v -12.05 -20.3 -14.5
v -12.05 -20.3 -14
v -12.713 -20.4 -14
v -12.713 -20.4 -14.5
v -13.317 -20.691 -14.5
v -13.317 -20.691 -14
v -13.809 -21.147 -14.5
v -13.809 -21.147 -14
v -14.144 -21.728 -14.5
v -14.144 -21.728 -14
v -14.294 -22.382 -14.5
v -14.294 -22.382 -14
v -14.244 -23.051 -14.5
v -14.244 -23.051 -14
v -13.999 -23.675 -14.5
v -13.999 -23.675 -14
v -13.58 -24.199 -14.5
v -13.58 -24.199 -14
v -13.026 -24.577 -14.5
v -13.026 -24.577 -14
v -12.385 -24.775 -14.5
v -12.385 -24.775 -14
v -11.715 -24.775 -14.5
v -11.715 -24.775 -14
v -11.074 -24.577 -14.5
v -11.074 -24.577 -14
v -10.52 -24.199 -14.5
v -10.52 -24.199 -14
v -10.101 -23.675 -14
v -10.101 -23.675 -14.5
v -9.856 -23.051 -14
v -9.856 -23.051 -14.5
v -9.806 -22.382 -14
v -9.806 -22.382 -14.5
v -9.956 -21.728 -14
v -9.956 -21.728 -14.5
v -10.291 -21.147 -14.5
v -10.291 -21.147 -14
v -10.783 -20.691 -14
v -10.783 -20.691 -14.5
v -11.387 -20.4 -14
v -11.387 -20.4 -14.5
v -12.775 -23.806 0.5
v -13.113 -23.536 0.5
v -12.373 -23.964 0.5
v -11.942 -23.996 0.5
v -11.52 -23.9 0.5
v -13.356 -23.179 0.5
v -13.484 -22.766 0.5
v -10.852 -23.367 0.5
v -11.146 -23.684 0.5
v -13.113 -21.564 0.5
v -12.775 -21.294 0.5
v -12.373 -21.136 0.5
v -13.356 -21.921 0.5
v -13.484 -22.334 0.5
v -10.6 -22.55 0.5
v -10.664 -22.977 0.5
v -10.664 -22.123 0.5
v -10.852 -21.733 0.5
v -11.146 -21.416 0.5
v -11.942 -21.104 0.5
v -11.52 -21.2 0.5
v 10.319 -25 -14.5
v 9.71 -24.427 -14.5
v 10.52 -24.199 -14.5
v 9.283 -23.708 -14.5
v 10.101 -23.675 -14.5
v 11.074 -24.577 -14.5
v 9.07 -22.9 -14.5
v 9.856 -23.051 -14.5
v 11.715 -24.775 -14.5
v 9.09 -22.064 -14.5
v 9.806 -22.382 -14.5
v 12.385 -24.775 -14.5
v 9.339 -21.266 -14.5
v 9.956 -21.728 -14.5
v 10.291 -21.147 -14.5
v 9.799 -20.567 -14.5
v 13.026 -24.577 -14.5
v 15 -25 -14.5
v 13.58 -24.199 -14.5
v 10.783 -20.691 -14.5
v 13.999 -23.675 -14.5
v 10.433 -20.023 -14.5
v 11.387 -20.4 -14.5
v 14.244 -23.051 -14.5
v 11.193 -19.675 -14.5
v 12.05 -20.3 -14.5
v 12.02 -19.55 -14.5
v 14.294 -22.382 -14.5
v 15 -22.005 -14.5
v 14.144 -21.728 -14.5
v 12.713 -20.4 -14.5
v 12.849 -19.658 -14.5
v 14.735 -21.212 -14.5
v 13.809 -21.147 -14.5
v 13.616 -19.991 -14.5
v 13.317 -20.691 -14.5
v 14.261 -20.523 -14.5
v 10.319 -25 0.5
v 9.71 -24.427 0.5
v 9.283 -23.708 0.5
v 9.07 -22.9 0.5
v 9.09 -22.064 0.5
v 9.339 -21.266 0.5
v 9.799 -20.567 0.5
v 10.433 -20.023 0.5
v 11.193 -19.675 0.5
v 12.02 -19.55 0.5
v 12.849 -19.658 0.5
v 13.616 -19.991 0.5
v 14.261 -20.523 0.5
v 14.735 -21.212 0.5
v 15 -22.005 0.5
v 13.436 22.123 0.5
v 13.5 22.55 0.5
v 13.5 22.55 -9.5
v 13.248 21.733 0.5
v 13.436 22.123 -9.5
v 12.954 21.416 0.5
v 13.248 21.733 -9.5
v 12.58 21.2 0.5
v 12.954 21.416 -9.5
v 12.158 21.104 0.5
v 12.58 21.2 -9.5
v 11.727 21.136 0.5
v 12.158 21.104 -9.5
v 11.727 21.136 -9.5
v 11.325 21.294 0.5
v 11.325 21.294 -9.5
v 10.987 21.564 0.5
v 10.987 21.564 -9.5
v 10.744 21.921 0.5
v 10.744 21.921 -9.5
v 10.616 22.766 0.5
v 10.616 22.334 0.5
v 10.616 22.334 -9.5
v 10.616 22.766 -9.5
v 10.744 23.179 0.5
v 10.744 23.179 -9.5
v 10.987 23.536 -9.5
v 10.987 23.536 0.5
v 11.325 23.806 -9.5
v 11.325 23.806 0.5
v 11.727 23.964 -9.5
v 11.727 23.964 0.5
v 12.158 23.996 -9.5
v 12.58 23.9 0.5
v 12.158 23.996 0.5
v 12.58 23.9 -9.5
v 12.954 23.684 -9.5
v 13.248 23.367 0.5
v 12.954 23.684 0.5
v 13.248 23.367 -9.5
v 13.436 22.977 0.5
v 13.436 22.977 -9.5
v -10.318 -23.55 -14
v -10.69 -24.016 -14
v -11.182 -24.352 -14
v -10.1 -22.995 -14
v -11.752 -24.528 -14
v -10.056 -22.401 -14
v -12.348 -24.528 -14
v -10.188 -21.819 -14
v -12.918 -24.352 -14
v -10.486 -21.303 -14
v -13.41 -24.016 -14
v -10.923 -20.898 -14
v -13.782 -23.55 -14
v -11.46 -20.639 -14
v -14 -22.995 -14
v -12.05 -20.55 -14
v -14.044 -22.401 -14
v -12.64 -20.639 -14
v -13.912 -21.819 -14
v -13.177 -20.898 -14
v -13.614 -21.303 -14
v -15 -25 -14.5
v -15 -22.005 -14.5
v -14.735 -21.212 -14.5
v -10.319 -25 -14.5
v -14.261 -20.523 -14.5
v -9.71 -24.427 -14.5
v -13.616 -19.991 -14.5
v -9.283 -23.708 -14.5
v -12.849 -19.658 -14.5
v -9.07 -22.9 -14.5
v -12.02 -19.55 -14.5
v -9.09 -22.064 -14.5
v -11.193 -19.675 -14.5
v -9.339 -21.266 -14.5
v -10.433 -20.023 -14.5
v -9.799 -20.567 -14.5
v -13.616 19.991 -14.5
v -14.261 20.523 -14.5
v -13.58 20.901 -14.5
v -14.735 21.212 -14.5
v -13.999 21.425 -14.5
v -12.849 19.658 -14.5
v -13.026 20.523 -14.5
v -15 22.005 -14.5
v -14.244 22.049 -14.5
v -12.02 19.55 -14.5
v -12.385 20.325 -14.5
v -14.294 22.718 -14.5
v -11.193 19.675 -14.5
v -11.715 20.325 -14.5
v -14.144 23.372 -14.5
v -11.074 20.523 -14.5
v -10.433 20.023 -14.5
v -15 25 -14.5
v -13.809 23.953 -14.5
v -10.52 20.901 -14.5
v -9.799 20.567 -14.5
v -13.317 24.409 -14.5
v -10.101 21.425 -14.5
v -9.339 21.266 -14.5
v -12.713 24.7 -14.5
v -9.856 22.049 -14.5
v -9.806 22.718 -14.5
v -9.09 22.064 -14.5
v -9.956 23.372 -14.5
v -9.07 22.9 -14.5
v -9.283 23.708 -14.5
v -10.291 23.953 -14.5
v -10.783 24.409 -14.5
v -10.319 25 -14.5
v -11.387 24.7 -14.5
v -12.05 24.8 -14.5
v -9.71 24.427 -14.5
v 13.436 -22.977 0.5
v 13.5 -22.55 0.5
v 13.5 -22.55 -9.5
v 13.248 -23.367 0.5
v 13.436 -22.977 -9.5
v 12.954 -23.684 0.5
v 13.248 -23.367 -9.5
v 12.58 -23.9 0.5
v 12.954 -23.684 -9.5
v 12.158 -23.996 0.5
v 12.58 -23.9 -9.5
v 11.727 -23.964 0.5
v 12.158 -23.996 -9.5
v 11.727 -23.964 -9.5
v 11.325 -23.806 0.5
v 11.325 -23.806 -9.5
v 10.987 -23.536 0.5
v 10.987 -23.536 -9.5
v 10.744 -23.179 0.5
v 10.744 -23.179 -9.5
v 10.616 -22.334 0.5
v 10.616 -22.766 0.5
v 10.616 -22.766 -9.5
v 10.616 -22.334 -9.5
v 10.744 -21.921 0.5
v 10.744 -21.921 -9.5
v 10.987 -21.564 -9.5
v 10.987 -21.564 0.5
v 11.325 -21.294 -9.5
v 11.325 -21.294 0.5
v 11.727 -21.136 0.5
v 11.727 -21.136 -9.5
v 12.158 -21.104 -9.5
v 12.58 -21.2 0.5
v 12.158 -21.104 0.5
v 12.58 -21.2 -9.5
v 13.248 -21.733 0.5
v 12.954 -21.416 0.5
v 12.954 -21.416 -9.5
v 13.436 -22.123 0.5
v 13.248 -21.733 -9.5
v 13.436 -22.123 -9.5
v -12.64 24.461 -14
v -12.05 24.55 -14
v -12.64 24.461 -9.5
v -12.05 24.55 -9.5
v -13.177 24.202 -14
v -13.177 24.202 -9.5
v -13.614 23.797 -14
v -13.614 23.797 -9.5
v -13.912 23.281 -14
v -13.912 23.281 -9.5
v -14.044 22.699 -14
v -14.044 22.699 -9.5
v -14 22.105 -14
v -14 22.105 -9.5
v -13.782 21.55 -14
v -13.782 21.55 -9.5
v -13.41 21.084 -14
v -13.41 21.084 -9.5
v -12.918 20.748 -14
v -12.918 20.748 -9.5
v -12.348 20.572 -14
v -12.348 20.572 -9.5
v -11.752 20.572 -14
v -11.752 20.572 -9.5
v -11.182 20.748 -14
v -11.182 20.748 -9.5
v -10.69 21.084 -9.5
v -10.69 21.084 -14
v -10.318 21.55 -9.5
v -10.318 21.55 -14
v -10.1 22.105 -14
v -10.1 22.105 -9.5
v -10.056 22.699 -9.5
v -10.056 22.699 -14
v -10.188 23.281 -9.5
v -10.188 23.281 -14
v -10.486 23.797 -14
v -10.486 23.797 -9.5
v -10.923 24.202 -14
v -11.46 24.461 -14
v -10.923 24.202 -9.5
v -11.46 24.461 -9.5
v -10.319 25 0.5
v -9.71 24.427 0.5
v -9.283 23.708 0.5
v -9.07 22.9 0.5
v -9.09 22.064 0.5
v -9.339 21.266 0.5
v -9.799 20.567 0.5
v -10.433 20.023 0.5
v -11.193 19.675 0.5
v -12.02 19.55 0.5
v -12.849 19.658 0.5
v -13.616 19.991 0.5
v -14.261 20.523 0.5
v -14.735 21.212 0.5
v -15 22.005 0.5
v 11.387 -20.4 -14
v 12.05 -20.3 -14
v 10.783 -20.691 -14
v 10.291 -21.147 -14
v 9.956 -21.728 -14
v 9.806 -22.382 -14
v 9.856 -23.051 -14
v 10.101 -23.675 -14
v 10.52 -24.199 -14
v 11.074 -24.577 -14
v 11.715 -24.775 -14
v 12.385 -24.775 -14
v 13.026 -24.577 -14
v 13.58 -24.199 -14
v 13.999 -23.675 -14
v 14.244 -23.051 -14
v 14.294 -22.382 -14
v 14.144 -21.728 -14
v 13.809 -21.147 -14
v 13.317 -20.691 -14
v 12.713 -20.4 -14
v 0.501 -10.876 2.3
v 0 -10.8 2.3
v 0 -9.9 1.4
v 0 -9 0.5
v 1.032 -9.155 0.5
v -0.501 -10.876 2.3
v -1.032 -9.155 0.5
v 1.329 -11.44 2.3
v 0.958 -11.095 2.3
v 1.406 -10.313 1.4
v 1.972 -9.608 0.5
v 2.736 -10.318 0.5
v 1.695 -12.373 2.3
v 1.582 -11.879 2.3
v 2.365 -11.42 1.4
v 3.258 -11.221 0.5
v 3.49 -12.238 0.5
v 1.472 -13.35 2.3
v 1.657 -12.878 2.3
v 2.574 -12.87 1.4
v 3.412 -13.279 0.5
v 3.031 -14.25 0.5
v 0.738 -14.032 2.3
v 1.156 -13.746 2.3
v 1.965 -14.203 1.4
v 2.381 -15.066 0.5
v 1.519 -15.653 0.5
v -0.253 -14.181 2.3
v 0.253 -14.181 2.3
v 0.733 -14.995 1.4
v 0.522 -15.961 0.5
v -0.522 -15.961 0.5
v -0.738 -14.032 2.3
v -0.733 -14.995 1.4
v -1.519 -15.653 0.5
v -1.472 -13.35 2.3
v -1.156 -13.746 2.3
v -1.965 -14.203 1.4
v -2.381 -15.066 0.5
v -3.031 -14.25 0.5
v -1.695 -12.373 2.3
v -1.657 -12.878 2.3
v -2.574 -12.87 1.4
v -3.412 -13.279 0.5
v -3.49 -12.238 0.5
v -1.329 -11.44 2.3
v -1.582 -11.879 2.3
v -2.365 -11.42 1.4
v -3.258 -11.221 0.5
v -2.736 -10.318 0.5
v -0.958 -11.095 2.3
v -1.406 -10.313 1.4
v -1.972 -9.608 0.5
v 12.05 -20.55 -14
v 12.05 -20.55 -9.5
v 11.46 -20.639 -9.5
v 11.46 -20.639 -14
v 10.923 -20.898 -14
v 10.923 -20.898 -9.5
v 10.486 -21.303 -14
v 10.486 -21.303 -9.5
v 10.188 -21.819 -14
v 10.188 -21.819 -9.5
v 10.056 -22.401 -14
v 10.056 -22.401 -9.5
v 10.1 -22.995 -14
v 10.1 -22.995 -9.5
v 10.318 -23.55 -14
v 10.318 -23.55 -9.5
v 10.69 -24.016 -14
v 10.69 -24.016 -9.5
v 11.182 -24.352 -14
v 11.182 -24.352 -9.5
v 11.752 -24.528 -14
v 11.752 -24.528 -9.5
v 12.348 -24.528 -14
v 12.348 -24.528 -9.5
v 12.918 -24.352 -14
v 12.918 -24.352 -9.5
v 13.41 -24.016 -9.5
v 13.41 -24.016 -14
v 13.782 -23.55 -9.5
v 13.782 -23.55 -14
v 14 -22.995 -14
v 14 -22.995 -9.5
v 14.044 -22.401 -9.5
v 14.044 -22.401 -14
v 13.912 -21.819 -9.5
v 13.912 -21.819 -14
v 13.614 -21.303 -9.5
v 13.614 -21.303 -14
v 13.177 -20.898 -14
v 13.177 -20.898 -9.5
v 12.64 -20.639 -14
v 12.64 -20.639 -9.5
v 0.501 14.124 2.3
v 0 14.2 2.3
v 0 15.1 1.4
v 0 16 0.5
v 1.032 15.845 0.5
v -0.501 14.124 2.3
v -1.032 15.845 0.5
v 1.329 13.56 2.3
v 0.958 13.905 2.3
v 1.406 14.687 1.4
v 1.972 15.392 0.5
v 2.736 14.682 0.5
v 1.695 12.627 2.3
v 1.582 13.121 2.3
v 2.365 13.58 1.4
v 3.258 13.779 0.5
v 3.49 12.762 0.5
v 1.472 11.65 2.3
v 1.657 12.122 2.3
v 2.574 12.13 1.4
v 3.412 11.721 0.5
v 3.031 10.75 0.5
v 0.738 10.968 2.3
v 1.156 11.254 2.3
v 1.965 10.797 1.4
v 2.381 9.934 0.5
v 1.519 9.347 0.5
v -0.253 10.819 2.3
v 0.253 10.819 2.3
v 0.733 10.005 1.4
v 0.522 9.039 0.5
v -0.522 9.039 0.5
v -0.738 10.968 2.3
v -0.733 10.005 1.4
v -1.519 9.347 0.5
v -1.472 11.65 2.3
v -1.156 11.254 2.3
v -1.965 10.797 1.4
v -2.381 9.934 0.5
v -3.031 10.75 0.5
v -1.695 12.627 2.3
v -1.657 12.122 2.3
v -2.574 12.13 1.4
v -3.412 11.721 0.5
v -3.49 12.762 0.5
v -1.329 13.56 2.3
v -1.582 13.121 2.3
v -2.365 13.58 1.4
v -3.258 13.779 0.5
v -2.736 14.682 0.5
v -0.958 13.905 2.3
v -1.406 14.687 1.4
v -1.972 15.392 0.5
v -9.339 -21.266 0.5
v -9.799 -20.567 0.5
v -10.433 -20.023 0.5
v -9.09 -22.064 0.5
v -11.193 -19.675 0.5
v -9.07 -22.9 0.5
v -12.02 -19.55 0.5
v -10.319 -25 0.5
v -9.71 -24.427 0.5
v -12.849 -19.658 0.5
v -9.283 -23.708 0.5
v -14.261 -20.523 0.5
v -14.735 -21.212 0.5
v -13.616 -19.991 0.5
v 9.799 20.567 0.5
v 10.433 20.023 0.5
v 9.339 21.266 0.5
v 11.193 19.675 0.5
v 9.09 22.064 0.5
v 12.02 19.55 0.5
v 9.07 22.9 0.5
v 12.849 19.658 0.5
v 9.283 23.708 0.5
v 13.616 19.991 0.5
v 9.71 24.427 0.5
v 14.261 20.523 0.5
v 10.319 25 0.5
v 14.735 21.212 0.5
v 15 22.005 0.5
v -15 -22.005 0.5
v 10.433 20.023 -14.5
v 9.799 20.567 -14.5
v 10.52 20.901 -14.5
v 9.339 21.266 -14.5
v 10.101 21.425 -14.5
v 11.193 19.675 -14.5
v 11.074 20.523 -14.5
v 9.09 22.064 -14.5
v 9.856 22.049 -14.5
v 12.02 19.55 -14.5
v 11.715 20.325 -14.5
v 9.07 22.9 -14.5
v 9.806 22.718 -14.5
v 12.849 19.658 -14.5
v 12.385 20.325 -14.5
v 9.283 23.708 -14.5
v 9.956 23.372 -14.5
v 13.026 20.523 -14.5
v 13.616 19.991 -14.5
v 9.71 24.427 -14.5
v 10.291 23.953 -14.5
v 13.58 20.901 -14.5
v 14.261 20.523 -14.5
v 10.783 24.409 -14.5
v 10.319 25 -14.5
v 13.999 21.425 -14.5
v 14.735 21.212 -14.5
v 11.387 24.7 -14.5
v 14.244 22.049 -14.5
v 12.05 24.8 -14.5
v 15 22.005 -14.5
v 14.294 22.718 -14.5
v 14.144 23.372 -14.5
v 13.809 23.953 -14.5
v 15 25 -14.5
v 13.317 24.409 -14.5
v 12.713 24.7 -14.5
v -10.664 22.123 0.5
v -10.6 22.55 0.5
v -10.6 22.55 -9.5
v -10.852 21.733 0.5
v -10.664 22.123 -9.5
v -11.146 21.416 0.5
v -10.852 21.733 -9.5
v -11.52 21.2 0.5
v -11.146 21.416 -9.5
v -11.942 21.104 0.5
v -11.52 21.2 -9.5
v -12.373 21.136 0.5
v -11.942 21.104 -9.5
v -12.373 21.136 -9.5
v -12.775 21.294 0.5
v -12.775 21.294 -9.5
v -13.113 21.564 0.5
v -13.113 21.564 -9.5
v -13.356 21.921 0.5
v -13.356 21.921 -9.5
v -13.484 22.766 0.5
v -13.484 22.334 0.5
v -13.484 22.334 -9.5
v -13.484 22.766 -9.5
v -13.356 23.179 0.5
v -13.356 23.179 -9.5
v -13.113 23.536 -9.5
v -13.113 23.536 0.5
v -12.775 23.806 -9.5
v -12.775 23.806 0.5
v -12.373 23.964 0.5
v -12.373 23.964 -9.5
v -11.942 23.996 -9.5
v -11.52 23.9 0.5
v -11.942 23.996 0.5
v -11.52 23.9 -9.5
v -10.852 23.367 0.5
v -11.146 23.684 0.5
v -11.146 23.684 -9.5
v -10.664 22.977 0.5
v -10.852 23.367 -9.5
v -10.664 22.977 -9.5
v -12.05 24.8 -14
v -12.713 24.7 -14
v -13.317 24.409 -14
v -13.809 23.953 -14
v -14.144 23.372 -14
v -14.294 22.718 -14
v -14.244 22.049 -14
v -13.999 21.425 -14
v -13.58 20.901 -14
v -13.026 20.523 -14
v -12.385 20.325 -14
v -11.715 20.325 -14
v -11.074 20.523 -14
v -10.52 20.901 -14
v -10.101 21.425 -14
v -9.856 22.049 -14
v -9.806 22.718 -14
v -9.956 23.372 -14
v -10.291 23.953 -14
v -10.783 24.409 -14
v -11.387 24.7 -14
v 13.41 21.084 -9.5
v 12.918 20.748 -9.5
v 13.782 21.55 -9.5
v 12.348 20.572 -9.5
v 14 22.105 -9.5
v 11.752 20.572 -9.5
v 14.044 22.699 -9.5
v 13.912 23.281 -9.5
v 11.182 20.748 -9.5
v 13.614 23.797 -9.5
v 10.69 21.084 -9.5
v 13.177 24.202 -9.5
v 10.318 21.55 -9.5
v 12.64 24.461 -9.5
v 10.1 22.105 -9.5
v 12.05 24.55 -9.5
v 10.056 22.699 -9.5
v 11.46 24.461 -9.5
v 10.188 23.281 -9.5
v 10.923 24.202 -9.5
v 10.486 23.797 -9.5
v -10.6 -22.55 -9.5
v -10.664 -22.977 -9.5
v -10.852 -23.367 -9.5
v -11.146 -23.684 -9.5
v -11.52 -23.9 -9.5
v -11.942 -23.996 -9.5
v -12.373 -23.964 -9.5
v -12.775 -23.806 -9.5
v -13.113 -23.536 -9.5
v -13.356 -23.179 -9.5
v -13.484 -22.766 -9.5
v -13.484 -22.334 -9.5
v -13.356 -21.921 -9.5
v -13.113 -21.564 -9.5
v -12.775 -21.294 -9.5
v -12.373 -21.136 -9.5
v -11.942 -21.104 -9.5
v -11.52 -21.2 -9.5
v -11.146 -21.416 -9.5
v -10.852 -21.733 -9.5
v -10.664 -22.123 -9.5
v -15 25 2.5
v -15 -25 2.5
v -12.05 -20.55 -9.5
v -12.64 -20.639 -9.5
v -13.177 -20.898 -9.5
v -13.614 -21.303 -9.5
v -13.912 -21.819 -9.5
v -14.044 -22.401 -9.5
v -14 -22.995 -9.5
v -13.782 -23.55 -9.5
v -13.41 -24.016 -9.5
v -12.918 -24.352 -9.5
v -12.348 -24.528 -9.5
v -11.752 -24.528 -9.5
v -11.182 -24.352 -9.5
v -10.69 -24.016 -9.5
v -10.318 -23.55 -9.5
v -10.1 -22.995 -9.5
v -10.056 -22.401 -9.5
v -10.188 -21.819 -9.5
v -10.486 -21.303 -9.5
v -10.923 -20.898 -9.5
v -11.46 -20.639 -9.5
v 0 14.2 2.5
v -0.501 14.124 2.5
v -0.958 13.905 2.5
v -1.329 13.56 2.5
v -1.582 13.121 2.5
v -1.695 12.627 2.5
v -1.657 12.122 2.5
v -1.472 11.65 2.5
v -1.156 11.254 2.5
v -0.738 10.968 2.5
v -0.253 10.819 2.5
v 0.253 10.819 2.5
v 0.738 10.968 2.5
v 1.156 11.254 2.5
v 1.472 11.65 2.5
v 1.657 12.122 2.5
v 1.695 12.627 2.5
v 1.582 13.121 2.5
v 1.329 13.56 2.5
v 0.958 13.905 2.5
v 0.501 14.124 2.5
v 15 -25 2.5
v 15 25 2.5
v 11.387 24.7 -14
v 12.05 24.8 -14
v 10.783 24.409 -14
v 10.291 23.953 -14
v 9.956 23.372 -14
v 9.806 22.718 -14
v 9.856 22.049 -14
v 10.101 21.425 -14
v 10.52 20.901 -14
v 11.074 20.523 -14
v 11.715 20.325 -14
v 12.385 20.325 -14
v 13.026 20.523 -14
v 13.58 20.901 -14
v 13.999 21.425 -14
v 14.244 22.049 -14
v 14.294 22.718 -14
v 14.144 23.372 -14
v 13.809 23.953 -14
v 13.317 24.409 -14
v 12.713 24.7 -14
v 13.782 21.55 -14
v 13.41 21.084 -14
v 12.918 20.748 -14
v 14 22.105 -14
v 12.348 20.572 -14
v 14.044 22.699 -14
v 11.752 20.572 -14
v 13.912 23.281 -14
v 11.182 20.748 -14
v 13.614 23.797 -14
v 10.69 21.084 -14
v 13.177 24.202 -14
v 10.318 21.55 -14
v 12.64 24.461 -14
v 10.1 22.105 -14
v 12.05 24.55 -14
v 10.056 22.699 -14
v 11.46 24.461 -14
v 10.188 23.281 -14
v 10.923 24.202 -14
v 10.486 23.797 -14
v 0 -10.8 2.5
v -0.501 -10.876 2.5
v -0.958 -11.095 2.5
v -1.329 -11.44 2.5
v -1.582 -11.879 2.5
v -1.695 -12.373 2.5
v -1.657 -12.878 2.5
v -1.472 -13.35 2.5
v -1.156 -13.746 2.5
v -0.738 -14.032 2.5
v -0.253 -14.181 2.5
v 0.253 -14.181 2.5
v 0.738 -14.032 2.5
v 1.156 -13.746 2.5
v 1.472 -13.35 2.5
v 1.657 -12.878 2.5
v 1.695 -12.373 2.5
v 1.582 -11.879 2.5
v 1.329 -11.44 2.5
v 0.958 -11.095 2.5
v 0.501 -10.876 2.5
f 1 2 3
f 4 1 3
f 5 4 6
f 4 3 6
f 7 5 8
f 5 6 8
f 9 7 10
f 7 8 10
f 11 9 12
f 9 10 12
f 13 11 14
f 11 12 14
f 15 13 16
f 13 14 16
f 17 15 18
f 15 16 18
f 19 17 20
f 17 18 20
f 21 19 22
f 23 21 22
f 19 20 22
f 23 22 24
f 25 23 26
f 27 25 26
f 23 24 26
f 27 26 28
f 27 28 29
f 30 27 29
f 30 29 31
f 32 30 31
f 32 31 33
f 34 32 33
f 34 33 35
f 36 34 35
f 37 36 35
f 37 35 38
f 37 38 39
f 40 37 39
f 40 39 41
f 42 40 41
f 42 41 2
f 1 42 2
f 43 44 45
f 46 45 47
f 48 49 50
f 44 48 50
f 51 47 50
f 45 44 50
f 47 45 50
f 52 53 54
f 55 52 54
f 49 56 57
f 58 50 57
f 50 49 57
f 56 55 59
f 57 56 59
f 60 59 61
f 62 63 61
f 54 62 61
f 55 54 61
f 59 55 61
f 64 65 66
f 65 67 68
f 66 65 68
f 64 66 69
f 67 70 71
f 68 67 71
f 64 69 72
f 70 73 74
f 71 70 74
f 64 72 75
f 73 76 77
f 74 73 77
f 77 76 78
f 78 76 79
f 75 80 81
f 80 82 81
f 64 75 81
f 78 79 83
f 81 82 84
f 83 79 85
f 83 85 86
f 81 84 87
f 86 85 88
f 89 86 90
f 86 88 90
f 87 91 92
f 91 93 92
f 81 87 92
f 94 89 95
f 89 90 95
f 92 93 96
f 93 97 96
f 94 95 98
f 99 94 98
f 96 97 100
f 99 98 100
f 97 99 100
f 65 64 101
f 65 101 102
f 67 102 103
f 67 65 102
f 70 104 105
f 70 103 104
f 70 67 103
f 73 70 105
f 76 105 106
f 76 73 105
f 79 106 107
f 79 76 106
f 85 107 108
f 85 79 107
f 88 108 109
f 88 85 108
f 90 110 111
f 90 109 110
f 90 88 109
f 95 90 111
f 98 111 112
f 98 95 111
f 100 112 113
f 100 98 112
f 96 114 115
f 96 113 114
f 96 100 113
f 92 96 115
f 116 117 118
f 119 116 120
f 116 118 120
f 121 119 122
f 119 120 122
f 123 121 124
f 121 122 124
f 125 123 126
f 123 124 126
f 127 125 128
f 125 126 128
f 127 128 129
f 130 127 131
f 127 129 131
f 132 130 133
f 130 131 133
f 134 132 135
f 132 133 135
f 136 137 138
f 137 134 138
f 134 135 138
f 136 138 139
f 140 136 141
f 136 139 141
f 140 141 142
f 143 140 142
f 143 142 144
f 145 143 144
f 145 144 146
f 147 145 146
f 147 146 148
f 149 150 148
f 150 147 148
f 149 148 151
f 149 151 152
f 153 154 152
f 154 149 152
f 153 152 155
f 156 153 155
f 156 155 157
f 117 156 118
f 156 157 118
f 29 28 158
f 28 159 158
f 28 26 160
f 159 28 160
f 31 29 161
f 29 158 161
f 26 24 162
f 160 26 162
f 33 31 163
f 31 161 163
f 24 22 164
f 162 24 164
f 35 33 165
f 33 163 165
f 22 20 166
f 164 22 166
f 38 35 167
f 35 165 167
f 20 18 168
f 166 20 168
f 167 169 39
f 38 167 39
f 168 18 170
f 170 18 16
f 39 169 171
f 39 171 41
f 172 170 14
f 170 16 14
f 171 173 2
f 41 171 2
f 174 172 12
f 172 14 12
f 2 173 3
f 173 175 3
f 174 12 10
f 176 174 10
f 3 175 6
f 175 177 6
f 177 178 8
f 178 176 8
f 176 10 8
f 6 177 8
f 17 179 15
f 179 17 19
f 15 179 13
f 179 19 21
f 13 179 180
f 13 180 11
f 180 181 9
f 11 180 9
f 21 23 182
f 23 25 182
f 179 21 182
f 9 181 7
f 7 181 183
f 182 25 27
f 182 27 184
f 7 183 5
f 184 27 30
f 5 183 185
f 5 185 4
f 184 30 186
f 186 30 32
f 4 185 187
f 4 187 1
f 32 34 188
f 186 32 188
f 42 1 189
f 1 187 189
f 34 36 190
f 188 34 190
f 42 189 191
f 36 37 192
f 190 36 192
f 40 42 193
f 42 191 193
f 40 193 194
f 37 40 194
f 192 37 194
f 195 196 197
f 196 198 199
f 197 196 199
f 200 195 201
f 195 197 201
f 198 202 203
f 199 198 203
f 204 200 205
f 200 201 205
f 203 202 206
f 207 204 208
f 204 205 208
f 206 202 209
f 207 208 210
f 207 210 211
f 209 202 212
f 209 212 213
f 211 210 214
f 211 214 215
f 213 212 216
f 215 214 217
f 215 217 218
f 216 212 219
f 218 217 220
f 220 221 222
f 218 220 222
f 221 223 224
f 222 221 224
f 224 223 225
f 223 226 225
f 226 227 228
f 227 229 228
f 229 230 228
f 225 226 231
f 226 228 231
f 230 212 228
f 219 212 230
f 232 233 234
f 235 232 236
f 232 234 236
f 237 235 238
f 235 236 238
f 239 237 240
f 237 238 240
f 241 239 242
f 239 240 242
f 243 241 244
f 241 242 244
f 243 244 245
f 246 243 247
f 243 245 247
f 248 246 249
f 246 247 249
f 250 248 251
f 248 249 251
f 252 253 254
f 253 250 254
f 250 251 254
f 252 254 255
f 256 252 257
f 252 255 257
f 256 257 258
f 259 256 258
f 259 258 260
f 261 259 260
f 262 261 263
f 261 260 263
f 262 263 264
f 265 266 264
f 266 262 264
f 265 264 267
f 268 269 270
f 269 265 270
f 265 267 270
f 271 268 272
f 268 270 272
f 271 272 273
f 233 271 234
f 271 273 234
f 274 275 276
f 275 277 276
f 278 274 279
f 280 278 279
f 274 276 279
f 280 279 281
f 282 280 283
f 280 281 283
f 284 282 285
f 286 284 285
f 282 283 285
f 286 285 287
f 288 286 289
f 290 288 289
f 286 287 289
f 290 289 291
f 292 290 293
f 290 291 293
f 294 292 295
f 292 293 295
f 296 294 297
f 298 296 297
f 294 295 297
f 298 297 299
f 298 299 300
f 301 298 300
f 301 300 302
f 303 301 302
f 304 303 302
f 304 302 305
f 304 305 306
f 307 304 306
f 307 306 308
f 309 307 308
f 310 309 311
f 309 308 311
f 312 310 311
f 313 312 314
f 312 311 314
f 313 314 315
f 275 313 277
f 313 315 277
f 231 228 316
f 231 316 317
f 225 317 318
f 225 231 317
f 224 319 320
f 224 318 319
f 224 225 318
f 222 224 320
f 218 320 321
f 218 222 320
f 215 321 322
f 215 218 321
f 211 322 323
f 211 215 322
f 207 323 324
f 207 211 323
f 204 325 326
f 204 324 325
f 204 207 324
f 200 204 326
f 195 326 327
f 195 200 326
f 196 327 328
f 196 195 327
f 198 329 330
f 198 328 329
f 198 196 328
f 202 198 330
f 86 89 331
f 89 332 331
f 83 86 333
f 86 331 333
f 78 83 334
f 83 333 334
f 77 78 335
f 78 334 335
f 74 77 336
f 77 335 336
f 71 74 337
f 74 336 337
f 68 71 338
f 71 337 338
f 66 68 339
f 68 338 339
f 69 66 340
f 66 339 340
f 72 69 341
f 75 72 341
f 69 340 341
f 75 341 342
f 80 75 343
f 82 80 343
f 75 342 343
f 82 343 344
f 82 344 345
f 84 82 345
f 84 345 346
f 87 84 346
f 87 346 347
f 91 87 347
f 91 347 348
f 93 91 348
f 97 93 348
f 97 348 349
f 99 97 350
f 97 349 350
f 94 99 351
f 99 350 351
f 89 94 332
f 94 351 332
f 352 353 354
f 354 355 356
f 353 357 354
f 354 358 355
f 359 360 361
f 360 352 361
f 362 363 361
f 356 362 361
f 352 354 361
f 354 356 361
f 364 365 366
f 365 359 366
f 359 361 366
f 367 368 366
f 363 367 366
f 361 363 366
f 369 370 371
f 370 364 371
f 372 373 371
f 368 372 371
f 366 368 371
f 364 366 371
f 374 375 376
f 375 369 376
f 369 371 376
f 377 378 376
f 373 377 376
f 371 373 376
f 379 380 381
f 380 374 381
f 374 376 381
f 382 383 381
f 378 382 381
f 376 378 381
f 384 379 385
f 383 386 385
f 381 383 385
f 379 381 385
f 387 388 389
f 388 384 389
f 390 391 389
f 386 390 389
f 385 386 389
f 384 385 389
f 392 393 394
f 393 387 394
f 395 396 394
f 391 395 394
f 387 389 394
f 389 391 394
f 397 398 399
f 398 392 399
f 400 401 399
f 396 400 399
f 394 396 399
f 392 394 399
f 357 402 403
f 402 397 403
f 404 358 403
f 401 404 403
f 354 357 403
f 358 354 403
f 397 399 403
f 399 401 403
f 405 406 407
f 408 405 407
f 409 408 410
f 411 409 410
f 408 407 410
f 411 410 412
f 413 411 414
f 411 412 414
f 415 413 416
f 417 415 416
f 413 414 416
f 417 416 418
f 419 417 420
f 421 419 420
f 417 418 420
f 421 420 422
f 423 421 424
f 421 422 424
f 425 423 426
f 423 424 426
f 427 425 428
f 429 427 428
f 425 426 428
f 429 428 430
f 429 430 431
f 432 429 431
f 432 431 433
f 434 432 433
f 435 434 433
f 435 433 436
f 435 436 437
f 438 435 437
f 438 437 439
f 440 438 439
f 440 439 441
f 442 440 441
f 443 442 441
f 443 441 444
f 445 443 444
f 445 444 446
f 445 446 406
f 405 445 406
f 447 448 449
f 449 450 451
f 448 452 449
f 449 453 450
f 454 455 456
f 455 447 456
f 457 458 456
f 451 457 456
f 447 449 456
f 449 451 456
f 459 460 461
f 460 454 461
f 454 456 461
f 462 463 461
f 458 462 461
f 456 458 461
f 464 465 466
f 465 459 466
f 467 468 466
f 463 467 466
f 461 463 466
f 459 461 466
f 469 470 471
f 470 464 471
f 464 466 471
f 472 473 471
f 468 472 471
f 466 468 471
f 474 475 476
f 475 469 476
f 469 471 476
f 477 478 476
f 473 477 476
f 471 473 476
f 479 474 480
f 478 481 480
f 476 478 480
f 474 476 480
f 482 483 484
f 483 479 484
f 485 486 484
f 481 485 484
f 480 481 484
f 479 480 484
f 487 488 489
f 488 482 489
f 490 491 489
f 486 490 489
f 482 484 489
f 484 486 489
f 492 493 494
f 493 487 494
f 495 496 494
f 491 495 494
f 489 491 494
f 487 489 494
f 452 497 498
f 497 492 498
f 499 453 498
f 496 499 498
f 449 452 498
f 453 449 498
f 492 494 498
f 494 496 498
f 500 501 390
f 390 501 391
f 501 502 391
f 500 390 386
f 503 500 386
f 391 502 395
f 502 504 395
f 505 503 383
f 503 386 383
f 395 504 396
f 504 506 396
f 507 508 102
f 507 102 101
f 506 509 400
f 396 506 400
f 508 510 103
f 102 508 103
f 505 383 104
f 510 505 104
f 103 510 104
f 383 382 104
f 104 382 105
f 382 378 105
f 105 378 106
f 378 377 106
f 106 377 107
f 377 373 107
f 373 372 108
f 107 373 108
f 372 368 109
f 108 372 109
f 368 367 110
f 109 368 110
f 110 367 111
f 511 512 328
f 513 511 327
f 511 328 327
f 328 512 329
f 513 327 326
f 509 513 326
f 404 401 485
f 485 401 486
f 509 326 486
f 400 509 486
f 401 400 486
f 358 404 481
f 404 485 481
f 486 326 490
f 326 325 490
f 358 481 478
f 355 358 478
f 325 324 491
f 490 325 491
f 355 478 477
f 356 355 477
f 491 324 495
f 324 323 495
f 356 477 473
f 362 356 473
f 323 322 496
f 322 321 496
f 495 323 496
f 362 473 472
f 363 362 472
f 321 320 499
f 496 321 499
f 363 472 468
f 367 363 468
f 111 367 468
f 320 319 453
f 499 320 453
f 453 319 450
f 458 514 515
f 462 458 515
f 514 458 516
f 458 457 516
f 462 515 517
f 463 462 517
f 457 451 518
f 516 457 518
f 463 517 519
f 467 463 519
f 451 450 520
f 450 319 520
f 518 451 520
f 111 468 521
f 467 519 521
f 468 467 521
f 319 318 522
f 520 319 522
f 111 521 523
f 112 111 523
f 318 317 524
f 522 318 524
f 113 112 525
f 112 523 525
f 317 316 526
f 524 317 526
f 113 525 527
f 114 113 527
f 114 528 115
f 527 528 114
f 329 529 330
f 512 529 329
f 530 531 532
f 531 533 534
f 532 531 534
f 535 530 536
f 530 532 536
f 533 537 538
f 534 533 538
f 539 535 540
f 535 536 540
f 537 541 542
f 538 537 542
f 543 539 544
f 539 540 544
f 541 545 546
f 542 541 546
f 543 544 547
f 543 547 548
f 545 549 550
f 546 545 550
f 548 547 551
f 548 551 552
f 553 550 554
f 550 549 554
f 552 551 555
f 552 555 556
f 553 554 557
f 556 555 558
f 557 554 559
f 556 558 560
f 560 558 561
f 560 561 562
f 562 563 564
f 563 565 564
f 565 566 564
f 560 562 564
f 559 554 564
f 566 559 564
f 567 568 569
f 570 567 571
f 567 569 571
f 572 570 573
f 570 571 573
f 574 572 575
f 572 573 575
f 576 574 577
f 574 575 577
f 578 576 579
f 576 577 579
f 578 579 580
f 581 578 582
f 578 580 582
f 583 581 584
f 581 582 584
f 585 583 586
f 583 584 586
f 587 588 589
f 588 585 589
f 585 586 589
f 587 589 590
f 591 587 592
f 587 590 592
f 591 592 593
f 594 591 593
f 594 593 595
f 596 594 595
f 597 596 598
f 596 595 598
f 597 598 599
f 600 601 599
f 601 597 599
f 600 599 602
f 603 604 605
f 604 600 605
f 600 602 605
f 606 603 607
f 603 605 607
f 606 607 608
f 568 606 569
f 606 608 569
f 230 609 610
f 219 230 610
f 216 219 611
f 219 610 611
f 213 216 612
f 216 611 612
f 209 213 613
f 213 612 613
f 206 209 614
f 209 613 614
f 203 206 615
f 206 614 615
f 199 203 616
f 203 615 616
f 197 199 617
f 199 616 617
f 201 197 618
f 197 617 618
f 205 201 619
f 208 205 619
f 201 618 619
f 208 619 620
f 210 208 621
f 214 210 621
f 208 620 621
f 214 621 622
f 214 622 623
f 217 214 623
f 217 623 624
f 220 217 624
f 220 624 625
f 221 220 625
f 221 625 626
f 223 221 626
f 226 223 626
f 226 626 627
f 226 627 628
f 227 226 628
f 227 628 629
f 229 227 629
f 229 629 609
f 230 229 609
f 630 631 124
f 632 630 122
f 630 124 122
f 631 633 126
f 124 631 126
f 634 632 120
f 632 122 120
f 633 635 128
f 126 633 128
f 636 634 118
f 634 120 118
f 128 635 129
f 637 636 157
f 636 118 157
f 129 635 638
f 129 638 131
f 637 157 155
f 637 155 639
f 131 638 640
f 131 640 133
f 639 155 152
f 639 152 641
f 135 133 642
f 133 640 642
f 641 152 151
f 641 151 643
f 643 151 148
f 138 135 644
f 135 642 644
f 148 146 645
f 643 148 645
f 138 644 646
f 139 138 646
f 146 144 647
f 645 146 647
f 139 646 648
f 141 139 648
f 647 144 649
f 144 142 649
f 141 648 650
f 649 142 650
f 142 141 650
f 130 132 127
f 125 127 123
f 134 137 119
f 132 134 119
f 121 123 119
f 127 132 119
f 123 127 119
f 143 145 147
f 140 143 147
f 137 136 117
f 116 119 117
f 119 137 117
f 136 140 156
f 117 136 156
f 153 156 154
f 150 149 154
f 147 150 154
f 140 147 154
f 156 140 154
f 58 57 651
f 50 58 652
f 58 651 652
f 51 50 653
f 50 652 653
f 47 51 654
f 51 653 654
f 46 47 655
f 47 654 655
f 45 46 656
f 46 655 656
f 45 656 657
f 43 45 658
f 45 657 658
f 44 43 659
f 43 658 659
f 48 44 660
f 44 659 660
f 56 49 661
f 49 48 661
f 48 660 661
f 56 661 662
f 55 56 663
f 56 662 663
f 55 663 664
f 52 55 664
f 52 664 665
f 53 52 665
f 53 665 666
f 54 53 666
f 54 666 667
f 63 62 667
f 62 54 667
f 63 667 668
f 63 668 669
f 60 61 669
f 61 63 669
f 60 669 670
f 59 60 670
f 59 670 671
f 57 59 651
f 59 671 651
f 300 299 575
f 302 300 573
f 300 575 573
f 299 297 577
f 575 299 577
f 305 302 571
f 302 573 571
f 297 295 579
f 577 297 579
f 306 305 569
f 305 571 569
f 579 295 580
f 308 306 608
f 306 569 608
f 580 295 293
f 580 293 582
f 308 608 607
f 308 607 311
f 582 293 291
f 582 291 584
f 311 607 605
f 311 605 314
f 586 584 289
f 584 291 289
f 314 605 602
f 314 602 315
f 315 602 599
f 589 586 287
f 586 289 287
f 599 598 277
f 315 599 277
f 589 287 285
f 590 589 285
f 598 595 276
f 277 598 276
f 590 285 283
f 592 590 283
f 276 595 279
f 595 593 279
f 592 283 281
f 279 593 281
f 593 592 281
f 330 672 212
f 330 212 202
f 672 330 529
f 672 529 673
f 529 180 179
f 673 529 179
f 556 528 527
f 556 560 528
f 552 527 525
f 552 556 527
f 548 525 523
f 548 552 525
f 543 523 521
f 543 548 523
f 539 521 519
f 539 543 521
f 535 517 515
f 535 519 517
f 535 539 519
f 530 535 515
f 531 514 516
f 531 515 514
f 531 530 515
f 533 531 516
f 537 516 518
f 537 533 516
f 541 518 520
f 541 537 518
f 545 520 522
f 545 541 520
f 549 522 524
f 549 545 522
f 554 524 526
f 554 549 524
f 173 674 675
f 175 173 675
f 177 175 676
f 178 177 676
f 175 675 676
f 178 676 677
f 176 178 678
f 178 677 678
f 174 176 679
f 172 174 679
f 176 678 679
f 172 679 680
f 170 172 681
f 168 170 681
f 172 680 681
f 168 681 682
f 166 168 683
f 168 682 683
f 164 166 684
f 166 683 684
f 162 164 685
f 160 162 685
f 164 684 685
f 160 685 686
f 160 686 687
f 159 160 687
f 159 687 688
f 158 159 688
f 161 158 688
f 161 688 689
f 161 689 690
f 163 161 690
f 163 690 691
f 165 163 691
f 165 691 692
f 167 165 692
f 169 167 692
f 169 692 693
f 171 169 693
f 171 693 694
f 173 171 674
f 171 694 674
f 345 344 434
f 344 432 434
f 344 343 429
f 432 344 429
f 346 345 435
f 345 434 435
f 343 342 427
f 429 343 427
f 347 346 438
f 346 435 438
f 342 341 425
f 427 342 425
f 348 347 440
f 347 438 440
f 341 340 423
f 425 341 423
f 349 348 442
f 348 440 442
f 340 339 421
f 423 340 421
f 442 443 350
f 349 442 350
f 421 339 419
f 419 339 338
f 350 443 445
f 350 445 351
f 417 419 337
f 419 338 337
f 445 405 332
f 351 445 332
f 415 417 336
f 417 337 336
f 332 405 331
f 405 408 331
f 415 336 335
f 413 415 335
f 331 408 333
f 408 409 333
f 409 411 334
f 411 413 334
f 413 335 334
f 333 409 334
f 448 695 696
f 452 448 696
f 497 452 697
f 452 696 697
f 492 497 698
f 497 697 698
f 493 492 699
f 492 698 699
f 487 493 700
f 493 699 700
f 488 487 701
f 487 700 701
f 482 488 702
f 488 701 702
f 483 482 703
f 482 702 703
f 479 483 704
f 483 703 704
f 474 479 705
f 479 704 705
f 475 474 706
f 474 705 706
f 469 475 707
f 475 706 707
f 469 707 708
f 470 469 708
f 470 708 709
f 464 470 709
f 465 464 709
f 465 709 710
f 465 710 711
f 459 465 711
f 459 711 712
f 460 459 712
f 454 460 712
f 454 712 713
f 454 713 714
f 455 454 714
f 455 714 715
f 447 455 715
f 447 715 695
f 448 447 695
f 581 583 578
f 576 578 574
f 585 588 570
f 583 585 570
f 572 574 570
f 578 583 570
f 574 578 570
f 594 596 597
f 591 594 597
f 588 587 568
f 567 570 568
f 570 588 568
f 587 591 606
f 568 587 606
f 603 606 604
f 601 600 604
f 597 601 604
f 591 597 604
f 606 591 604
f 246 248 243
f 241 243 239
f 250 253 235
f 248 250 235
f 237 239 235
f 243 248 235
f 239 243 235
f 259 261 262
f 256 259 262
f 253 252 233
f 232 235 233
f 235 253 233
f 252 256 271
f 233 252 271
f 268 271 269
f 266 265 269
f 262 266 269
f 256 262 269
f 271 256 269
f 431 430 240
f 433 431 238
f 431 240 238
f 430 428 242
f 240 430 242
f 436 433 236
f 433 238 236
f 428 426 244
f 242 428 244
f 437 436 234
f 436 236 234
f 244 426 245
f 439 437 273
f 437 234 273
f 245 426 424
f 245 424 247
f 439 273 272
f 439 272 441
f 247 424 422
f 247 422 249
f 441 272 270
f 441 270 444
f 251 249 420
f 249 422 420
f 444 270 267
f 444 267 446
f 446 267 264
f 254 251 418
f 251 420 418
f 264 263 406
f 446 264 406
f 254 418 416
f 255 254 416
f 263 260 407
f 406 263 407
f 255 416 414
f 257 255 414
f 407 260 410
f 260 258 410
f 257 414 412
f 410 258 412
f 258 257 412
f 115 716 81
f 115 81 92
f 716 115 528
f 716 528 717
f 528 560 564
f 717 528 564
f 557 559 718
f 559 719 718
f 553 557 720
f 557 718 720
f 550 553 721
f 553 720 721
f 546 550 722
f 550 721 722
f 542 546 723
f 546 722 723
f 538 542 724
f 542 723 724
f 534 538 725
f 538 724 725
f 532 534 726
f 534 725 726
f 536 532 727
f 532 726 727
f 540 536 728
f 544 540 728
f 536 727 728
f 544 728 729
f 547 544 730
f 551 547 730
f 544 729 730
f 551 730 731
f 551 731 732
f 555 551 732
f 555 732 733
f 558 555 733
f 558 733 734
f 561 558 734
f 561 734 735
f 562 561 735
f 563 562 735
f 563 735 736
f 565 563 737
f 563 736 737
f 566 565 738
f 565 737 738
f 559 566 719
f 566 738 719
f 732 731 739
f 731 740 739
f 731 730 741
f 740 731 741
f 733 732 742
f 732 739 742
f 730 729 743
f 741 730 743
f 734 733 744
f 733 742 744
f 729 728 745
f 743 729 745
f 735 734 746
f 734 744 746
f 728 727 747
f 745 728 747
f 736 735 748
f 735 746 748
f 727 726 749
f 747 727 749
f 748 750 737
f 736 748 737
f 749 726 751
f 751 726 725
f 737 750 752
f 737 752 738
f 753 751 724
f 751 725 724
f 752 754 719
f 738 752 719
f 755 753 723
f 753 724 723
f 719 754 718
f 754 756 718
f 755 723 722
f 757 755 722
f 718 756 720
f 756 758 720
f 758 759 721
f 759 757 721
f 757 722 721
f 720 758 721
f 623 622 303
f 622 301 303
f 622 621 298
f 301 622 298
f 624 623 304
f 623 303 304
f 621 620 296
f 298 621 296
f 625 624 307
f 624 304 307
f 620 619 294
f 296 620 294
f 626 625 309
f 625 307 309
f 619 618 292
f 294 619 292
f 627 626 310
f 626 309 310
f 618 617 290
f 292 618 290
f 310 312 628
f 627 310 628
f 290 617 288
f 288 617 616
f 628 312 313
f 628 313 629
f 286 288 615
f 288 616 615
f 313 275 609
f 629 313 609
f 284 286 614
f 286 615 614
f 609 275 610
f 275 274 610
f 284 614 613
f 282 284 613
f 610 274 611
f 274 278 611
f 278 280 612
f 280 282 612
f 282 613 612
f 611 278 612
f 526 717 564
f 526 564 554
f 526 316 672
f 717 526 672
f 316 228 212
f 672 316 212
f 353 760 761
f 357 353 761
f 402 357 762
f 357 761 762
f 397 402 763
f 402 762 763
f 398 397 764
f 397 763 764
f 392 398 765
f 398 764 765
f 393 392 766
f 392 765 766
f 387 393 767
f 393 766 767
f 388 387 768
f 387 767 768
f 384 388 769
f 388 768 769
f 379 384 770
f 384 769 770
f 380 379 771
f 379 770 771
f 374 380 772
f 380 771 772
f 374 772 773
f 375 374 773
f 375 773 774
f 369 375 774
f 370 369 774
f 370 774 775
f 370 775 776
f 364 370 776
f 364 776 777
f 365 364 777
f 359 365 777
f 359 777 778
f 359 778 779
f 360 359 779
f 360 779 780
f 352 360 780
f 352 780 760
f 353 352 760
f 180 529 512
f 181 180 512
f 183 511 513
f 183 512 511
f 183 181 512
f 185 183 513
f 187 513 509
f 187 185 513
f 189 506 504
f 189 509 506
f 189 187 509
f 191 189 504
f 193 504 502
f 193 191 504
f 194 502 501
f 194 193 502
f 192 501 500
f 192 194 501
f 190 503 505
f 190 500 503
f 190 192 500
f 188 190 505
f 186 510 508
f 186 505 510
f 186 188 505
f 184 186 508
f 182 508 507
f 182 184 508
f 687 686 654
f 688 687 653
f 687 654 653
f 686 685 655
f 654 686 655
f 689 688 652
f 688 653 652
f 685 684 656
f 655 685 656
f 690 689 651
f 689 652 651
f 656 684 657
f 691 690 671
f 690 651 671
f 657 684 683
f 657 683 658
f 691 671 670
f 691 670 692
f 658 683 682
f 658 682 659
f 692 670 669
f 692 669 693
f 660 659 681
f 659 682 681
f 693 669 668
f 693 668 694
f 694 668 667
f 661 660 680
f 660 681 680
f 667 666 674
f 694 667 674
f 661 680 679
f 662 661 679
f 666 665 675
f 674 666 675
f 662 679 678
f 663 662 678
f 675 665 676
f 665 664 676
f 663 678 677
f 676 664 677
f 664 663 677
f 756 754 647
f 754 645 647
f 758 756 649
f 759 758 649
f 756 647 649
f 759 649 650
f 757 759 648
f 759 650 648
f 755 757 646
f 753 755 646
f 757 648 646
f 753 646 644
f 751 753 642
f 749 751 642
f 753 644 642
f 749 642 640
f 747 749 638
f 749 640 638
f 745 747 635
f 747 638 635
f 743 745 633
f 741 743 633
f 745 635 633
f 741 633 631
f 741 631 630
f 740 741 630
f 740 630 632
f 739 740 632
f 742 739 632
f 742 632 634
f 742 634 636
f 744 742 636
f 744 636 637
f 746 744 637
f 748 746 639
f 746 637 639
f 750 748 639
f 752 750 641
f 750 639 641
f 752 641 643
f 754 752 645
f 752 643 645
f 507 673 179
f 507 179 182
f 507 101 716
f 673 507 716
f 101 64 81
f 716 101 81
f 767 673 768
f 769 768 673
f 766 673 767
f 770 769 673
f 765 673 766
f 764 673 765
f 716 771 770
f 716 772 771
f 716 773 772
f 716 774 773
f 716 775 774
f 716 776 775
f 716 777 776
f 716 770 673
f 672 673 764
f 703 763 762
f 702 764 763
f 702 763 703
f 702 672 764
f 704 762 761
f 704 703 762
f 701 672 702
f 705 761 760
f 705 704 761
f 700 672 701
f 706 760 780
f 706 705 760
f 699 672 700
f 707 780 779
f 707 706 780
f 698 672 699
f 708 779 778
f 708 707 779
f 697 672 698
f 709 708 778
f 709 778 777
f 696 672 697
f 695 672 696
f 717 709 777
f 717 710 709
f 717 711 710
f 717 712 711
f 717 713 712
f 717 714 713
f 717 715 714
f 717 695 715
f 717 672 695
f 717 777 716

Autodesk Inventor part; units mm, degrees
ref_plane "YZ Plane" through (0, 0, 0) normal (1, 0, 0) x (0, 1, 0)
ref_plane "XZ Plane" through (0, 0, 0) normal (0, 1, 0) x (-1, 0, 0)
ref_plane "XY Plane" through (0, 0, 0) normal (0, 0, 1) x (1, 0, 0)
ref_plane "Work Plane1" through (0, 0, -14.5) normal (0, 0, 1) x (1, 0, 0)
sketch "Sketch1" plane through (0, 0, -14.5) normal (0, 0, 1) x (1, 0, 0)
  arc A0 (10.3187, 25) -> (15, 22.0046) centre (12.05, 22.55) ccw projected
  line L0 (15, 22.0046) -> (15, 25) projected
  line L1 (15, 25) -> (10.3187, 25) projected
  circle A1 centre (12.05, 22.55) radius 1.45 projected
  arc A2 (15, -22.0046) -> (10.3187, -25) centre (12.05, -22.55) ccw projected
  line L2 (10.3187, -25) -> (15, -25) projected
  line L3 (15, -25) -> (15, -22.0046) projected
  circle A3 centre (12.05, -22.55) radius 1.45 projected
  arc A4 (-10.3187, -25) -> (-15, -22.0046) centre (-12.05, -22.55) ccw projected
  line L4 (-15, -22.0046) -> (-15, -25) projected
  line L5 (-15, -25) -> (-10.3187, -25) projected
  circle A5 centre (-12.05, -22.55) radius 1.45 projected
  circle A6 centre (-12.05, 22.55) radius 1.45 projected
  arc A7 (-15, 22.0046) -> (-10.3187, 25) centre (-12.05, 22.55) ccw projected
  line L6 (-10.3187, 25) -> (-15, 25) projected
  line L7 (-15, 25) -> (-15, 22.0046) projected
  point P0 (0, 0)
extrude "Extrusion1" add sketch "Sketch1" along normal blind 15
sketch "Sketch2" plane through (0, 0, 0.5) normal (0, 0, 1) x (1, 0, 0)
  line L0 (15, 22.0046) -> (15, 25) projected
  line L1 (15, 25) -> (10.3187, 25) projected
  arc A0 (10.3187, 25) -> (15, 22.0046) centre (12.05, 22.55) ccw projected
  circle A1 centre (12.05, 22.55) radius 1.45 projected
  line L2 (10.3187, -25) -> (15, -25) projected
  line L3 (15, -25) -> (15, -22.0046) projected
  arc A2 (15, -22.0046) -> (10.3187, -25) centre (12.05, -22.55) ccw projected
  circle A3 centre (12.05, -22.55) radius 1.45 projected
  line L4 (-15, -22.0046) -> (-15, -25) projected
  line L5 (-15, -25) -> (-10.3187, -25) projected
  arc A4 (-10.3187, -25) -> (-15, -22.0046) centre (-12.05, -22.55) ccw projected
  circle A5 centre (-12.05, -22.55) radius 1.45 projected
  line L6 (-10.3187, 25) -> (-15, 25) projected
  line L7 (-15, 25) -> (-15, 22.0046) projected
  arc A6 (-15, 22.0046) -> (-10.3187, 25) centre (-12.05, 22.55) ccw projected
  circle A7 centre (-12.05, 22.55) radius 1.45 projected
  line L8 (15, 25) -> (10.3187, 25) projected
  line L9 (-15, -25) -> (-10.3187, -25) projected
  line L10 (15, 25) -> (-15, 25)
  line L11 (-15, 25) -> (-15, -25)
  line L12 (-15, -25) -> (15, -25)
  line L13 (15, -25) -> (15, 25)
  point P0 (0, 0)
extrude "Extrusion2" add sketch "Sketch2" along normal blind 2 contours A0 L1 L0 | L13 A2 L12 A4 L11 A6 L10 A0 | L3 L2 A2 | A6 L7 L6 | L5 L4 A4 | A1 | A3 | A5 | A7
sketch "Sketch3" plane through (0, 0, -14.5) normal (0, 0, -1) x (-1, 0, 0)
  circle A0 centre (12.05, 22.55) radius 1.45 projected
  circle A1 centre (-12.05, 22.55) radius 1.45 projected
  circle A2 centre (-12.05, -22.55) radius 1.45 projected
  circle A3 centre (12.05, -22.55) radius 1.45 projected
  line L0 (15, -25) -> (-15, -25) projected
  line L1 (15, 25) -> (15, -25) projected
  line L2 (-15, 25) -> (15, 25) projected
  line L3 (-15, -25) -> (-15, 25) projected
  circle A4 centre (12.05, -22.55) radius 1.45 projected
  circle A5 centre (-12.05, -22.55) radius 1.45 projected
  circle A6 centre (-12.05, 22.55) radius 1.45 projected
  circle A7 centre (12.05, 22.55) radius 1.45 projected
  point P0 (0, 0)
hole "Hole1" at (-12.05, -22.55, -14.5) at (12.05, -22.55, -14.5) at (12.05, 22.55, -14.5) at (-12.05, 22.55, -14.5) direction (0, 0, 1) diameter 4 depth 5 counterbore diameter 4.5 counterbore depth 0.5
sketch "Sketch4" plane through (0, 0, 0.5) normal (0, 0, -1) x (-1, 0, 0)
  circle A0 centre (12.05, 22.55) radius 1.45 projected
  circle A1 centre (-12.05, 22.55) radius 1.45 projected
  circle A2 centre (-12.05, -22.55) radius 1.45 projected
  circle A3 centre (12.05, -22.55) radius 1.45 projected
  line L0 (15, -25) -> (-15, -25) projected
  line L1 (15, 25) -> (15, -25) projected
  line L2 (-15, 25) -> (15, 25) projected
  line L3 (-15, -25) -> (-15, 25) projected
  line L4 (0, 12.5) -> (0, -12.5)
  point P0 (0, 0)
  dimension "d11" = 12.5
  dimension "d12" = 12.5
  dimension "d13" = 12.5
  dimension "d14" = 12.5
hole "Hole2" at (0, 12.5, 0.5) at (0, -12.5, 0.5) direction (0, 0, 1) diameter 3.4 depth 5 countersink diameter 7 countersink angle 90 clearance for "Countersunk Flat Head Screw ISO 2009/7046" size "M3" standard "ISO"
equation "\"d11\" = d12"
equation "\"d13\" = d14"
properties part number "buck_holder" material "Glass"
